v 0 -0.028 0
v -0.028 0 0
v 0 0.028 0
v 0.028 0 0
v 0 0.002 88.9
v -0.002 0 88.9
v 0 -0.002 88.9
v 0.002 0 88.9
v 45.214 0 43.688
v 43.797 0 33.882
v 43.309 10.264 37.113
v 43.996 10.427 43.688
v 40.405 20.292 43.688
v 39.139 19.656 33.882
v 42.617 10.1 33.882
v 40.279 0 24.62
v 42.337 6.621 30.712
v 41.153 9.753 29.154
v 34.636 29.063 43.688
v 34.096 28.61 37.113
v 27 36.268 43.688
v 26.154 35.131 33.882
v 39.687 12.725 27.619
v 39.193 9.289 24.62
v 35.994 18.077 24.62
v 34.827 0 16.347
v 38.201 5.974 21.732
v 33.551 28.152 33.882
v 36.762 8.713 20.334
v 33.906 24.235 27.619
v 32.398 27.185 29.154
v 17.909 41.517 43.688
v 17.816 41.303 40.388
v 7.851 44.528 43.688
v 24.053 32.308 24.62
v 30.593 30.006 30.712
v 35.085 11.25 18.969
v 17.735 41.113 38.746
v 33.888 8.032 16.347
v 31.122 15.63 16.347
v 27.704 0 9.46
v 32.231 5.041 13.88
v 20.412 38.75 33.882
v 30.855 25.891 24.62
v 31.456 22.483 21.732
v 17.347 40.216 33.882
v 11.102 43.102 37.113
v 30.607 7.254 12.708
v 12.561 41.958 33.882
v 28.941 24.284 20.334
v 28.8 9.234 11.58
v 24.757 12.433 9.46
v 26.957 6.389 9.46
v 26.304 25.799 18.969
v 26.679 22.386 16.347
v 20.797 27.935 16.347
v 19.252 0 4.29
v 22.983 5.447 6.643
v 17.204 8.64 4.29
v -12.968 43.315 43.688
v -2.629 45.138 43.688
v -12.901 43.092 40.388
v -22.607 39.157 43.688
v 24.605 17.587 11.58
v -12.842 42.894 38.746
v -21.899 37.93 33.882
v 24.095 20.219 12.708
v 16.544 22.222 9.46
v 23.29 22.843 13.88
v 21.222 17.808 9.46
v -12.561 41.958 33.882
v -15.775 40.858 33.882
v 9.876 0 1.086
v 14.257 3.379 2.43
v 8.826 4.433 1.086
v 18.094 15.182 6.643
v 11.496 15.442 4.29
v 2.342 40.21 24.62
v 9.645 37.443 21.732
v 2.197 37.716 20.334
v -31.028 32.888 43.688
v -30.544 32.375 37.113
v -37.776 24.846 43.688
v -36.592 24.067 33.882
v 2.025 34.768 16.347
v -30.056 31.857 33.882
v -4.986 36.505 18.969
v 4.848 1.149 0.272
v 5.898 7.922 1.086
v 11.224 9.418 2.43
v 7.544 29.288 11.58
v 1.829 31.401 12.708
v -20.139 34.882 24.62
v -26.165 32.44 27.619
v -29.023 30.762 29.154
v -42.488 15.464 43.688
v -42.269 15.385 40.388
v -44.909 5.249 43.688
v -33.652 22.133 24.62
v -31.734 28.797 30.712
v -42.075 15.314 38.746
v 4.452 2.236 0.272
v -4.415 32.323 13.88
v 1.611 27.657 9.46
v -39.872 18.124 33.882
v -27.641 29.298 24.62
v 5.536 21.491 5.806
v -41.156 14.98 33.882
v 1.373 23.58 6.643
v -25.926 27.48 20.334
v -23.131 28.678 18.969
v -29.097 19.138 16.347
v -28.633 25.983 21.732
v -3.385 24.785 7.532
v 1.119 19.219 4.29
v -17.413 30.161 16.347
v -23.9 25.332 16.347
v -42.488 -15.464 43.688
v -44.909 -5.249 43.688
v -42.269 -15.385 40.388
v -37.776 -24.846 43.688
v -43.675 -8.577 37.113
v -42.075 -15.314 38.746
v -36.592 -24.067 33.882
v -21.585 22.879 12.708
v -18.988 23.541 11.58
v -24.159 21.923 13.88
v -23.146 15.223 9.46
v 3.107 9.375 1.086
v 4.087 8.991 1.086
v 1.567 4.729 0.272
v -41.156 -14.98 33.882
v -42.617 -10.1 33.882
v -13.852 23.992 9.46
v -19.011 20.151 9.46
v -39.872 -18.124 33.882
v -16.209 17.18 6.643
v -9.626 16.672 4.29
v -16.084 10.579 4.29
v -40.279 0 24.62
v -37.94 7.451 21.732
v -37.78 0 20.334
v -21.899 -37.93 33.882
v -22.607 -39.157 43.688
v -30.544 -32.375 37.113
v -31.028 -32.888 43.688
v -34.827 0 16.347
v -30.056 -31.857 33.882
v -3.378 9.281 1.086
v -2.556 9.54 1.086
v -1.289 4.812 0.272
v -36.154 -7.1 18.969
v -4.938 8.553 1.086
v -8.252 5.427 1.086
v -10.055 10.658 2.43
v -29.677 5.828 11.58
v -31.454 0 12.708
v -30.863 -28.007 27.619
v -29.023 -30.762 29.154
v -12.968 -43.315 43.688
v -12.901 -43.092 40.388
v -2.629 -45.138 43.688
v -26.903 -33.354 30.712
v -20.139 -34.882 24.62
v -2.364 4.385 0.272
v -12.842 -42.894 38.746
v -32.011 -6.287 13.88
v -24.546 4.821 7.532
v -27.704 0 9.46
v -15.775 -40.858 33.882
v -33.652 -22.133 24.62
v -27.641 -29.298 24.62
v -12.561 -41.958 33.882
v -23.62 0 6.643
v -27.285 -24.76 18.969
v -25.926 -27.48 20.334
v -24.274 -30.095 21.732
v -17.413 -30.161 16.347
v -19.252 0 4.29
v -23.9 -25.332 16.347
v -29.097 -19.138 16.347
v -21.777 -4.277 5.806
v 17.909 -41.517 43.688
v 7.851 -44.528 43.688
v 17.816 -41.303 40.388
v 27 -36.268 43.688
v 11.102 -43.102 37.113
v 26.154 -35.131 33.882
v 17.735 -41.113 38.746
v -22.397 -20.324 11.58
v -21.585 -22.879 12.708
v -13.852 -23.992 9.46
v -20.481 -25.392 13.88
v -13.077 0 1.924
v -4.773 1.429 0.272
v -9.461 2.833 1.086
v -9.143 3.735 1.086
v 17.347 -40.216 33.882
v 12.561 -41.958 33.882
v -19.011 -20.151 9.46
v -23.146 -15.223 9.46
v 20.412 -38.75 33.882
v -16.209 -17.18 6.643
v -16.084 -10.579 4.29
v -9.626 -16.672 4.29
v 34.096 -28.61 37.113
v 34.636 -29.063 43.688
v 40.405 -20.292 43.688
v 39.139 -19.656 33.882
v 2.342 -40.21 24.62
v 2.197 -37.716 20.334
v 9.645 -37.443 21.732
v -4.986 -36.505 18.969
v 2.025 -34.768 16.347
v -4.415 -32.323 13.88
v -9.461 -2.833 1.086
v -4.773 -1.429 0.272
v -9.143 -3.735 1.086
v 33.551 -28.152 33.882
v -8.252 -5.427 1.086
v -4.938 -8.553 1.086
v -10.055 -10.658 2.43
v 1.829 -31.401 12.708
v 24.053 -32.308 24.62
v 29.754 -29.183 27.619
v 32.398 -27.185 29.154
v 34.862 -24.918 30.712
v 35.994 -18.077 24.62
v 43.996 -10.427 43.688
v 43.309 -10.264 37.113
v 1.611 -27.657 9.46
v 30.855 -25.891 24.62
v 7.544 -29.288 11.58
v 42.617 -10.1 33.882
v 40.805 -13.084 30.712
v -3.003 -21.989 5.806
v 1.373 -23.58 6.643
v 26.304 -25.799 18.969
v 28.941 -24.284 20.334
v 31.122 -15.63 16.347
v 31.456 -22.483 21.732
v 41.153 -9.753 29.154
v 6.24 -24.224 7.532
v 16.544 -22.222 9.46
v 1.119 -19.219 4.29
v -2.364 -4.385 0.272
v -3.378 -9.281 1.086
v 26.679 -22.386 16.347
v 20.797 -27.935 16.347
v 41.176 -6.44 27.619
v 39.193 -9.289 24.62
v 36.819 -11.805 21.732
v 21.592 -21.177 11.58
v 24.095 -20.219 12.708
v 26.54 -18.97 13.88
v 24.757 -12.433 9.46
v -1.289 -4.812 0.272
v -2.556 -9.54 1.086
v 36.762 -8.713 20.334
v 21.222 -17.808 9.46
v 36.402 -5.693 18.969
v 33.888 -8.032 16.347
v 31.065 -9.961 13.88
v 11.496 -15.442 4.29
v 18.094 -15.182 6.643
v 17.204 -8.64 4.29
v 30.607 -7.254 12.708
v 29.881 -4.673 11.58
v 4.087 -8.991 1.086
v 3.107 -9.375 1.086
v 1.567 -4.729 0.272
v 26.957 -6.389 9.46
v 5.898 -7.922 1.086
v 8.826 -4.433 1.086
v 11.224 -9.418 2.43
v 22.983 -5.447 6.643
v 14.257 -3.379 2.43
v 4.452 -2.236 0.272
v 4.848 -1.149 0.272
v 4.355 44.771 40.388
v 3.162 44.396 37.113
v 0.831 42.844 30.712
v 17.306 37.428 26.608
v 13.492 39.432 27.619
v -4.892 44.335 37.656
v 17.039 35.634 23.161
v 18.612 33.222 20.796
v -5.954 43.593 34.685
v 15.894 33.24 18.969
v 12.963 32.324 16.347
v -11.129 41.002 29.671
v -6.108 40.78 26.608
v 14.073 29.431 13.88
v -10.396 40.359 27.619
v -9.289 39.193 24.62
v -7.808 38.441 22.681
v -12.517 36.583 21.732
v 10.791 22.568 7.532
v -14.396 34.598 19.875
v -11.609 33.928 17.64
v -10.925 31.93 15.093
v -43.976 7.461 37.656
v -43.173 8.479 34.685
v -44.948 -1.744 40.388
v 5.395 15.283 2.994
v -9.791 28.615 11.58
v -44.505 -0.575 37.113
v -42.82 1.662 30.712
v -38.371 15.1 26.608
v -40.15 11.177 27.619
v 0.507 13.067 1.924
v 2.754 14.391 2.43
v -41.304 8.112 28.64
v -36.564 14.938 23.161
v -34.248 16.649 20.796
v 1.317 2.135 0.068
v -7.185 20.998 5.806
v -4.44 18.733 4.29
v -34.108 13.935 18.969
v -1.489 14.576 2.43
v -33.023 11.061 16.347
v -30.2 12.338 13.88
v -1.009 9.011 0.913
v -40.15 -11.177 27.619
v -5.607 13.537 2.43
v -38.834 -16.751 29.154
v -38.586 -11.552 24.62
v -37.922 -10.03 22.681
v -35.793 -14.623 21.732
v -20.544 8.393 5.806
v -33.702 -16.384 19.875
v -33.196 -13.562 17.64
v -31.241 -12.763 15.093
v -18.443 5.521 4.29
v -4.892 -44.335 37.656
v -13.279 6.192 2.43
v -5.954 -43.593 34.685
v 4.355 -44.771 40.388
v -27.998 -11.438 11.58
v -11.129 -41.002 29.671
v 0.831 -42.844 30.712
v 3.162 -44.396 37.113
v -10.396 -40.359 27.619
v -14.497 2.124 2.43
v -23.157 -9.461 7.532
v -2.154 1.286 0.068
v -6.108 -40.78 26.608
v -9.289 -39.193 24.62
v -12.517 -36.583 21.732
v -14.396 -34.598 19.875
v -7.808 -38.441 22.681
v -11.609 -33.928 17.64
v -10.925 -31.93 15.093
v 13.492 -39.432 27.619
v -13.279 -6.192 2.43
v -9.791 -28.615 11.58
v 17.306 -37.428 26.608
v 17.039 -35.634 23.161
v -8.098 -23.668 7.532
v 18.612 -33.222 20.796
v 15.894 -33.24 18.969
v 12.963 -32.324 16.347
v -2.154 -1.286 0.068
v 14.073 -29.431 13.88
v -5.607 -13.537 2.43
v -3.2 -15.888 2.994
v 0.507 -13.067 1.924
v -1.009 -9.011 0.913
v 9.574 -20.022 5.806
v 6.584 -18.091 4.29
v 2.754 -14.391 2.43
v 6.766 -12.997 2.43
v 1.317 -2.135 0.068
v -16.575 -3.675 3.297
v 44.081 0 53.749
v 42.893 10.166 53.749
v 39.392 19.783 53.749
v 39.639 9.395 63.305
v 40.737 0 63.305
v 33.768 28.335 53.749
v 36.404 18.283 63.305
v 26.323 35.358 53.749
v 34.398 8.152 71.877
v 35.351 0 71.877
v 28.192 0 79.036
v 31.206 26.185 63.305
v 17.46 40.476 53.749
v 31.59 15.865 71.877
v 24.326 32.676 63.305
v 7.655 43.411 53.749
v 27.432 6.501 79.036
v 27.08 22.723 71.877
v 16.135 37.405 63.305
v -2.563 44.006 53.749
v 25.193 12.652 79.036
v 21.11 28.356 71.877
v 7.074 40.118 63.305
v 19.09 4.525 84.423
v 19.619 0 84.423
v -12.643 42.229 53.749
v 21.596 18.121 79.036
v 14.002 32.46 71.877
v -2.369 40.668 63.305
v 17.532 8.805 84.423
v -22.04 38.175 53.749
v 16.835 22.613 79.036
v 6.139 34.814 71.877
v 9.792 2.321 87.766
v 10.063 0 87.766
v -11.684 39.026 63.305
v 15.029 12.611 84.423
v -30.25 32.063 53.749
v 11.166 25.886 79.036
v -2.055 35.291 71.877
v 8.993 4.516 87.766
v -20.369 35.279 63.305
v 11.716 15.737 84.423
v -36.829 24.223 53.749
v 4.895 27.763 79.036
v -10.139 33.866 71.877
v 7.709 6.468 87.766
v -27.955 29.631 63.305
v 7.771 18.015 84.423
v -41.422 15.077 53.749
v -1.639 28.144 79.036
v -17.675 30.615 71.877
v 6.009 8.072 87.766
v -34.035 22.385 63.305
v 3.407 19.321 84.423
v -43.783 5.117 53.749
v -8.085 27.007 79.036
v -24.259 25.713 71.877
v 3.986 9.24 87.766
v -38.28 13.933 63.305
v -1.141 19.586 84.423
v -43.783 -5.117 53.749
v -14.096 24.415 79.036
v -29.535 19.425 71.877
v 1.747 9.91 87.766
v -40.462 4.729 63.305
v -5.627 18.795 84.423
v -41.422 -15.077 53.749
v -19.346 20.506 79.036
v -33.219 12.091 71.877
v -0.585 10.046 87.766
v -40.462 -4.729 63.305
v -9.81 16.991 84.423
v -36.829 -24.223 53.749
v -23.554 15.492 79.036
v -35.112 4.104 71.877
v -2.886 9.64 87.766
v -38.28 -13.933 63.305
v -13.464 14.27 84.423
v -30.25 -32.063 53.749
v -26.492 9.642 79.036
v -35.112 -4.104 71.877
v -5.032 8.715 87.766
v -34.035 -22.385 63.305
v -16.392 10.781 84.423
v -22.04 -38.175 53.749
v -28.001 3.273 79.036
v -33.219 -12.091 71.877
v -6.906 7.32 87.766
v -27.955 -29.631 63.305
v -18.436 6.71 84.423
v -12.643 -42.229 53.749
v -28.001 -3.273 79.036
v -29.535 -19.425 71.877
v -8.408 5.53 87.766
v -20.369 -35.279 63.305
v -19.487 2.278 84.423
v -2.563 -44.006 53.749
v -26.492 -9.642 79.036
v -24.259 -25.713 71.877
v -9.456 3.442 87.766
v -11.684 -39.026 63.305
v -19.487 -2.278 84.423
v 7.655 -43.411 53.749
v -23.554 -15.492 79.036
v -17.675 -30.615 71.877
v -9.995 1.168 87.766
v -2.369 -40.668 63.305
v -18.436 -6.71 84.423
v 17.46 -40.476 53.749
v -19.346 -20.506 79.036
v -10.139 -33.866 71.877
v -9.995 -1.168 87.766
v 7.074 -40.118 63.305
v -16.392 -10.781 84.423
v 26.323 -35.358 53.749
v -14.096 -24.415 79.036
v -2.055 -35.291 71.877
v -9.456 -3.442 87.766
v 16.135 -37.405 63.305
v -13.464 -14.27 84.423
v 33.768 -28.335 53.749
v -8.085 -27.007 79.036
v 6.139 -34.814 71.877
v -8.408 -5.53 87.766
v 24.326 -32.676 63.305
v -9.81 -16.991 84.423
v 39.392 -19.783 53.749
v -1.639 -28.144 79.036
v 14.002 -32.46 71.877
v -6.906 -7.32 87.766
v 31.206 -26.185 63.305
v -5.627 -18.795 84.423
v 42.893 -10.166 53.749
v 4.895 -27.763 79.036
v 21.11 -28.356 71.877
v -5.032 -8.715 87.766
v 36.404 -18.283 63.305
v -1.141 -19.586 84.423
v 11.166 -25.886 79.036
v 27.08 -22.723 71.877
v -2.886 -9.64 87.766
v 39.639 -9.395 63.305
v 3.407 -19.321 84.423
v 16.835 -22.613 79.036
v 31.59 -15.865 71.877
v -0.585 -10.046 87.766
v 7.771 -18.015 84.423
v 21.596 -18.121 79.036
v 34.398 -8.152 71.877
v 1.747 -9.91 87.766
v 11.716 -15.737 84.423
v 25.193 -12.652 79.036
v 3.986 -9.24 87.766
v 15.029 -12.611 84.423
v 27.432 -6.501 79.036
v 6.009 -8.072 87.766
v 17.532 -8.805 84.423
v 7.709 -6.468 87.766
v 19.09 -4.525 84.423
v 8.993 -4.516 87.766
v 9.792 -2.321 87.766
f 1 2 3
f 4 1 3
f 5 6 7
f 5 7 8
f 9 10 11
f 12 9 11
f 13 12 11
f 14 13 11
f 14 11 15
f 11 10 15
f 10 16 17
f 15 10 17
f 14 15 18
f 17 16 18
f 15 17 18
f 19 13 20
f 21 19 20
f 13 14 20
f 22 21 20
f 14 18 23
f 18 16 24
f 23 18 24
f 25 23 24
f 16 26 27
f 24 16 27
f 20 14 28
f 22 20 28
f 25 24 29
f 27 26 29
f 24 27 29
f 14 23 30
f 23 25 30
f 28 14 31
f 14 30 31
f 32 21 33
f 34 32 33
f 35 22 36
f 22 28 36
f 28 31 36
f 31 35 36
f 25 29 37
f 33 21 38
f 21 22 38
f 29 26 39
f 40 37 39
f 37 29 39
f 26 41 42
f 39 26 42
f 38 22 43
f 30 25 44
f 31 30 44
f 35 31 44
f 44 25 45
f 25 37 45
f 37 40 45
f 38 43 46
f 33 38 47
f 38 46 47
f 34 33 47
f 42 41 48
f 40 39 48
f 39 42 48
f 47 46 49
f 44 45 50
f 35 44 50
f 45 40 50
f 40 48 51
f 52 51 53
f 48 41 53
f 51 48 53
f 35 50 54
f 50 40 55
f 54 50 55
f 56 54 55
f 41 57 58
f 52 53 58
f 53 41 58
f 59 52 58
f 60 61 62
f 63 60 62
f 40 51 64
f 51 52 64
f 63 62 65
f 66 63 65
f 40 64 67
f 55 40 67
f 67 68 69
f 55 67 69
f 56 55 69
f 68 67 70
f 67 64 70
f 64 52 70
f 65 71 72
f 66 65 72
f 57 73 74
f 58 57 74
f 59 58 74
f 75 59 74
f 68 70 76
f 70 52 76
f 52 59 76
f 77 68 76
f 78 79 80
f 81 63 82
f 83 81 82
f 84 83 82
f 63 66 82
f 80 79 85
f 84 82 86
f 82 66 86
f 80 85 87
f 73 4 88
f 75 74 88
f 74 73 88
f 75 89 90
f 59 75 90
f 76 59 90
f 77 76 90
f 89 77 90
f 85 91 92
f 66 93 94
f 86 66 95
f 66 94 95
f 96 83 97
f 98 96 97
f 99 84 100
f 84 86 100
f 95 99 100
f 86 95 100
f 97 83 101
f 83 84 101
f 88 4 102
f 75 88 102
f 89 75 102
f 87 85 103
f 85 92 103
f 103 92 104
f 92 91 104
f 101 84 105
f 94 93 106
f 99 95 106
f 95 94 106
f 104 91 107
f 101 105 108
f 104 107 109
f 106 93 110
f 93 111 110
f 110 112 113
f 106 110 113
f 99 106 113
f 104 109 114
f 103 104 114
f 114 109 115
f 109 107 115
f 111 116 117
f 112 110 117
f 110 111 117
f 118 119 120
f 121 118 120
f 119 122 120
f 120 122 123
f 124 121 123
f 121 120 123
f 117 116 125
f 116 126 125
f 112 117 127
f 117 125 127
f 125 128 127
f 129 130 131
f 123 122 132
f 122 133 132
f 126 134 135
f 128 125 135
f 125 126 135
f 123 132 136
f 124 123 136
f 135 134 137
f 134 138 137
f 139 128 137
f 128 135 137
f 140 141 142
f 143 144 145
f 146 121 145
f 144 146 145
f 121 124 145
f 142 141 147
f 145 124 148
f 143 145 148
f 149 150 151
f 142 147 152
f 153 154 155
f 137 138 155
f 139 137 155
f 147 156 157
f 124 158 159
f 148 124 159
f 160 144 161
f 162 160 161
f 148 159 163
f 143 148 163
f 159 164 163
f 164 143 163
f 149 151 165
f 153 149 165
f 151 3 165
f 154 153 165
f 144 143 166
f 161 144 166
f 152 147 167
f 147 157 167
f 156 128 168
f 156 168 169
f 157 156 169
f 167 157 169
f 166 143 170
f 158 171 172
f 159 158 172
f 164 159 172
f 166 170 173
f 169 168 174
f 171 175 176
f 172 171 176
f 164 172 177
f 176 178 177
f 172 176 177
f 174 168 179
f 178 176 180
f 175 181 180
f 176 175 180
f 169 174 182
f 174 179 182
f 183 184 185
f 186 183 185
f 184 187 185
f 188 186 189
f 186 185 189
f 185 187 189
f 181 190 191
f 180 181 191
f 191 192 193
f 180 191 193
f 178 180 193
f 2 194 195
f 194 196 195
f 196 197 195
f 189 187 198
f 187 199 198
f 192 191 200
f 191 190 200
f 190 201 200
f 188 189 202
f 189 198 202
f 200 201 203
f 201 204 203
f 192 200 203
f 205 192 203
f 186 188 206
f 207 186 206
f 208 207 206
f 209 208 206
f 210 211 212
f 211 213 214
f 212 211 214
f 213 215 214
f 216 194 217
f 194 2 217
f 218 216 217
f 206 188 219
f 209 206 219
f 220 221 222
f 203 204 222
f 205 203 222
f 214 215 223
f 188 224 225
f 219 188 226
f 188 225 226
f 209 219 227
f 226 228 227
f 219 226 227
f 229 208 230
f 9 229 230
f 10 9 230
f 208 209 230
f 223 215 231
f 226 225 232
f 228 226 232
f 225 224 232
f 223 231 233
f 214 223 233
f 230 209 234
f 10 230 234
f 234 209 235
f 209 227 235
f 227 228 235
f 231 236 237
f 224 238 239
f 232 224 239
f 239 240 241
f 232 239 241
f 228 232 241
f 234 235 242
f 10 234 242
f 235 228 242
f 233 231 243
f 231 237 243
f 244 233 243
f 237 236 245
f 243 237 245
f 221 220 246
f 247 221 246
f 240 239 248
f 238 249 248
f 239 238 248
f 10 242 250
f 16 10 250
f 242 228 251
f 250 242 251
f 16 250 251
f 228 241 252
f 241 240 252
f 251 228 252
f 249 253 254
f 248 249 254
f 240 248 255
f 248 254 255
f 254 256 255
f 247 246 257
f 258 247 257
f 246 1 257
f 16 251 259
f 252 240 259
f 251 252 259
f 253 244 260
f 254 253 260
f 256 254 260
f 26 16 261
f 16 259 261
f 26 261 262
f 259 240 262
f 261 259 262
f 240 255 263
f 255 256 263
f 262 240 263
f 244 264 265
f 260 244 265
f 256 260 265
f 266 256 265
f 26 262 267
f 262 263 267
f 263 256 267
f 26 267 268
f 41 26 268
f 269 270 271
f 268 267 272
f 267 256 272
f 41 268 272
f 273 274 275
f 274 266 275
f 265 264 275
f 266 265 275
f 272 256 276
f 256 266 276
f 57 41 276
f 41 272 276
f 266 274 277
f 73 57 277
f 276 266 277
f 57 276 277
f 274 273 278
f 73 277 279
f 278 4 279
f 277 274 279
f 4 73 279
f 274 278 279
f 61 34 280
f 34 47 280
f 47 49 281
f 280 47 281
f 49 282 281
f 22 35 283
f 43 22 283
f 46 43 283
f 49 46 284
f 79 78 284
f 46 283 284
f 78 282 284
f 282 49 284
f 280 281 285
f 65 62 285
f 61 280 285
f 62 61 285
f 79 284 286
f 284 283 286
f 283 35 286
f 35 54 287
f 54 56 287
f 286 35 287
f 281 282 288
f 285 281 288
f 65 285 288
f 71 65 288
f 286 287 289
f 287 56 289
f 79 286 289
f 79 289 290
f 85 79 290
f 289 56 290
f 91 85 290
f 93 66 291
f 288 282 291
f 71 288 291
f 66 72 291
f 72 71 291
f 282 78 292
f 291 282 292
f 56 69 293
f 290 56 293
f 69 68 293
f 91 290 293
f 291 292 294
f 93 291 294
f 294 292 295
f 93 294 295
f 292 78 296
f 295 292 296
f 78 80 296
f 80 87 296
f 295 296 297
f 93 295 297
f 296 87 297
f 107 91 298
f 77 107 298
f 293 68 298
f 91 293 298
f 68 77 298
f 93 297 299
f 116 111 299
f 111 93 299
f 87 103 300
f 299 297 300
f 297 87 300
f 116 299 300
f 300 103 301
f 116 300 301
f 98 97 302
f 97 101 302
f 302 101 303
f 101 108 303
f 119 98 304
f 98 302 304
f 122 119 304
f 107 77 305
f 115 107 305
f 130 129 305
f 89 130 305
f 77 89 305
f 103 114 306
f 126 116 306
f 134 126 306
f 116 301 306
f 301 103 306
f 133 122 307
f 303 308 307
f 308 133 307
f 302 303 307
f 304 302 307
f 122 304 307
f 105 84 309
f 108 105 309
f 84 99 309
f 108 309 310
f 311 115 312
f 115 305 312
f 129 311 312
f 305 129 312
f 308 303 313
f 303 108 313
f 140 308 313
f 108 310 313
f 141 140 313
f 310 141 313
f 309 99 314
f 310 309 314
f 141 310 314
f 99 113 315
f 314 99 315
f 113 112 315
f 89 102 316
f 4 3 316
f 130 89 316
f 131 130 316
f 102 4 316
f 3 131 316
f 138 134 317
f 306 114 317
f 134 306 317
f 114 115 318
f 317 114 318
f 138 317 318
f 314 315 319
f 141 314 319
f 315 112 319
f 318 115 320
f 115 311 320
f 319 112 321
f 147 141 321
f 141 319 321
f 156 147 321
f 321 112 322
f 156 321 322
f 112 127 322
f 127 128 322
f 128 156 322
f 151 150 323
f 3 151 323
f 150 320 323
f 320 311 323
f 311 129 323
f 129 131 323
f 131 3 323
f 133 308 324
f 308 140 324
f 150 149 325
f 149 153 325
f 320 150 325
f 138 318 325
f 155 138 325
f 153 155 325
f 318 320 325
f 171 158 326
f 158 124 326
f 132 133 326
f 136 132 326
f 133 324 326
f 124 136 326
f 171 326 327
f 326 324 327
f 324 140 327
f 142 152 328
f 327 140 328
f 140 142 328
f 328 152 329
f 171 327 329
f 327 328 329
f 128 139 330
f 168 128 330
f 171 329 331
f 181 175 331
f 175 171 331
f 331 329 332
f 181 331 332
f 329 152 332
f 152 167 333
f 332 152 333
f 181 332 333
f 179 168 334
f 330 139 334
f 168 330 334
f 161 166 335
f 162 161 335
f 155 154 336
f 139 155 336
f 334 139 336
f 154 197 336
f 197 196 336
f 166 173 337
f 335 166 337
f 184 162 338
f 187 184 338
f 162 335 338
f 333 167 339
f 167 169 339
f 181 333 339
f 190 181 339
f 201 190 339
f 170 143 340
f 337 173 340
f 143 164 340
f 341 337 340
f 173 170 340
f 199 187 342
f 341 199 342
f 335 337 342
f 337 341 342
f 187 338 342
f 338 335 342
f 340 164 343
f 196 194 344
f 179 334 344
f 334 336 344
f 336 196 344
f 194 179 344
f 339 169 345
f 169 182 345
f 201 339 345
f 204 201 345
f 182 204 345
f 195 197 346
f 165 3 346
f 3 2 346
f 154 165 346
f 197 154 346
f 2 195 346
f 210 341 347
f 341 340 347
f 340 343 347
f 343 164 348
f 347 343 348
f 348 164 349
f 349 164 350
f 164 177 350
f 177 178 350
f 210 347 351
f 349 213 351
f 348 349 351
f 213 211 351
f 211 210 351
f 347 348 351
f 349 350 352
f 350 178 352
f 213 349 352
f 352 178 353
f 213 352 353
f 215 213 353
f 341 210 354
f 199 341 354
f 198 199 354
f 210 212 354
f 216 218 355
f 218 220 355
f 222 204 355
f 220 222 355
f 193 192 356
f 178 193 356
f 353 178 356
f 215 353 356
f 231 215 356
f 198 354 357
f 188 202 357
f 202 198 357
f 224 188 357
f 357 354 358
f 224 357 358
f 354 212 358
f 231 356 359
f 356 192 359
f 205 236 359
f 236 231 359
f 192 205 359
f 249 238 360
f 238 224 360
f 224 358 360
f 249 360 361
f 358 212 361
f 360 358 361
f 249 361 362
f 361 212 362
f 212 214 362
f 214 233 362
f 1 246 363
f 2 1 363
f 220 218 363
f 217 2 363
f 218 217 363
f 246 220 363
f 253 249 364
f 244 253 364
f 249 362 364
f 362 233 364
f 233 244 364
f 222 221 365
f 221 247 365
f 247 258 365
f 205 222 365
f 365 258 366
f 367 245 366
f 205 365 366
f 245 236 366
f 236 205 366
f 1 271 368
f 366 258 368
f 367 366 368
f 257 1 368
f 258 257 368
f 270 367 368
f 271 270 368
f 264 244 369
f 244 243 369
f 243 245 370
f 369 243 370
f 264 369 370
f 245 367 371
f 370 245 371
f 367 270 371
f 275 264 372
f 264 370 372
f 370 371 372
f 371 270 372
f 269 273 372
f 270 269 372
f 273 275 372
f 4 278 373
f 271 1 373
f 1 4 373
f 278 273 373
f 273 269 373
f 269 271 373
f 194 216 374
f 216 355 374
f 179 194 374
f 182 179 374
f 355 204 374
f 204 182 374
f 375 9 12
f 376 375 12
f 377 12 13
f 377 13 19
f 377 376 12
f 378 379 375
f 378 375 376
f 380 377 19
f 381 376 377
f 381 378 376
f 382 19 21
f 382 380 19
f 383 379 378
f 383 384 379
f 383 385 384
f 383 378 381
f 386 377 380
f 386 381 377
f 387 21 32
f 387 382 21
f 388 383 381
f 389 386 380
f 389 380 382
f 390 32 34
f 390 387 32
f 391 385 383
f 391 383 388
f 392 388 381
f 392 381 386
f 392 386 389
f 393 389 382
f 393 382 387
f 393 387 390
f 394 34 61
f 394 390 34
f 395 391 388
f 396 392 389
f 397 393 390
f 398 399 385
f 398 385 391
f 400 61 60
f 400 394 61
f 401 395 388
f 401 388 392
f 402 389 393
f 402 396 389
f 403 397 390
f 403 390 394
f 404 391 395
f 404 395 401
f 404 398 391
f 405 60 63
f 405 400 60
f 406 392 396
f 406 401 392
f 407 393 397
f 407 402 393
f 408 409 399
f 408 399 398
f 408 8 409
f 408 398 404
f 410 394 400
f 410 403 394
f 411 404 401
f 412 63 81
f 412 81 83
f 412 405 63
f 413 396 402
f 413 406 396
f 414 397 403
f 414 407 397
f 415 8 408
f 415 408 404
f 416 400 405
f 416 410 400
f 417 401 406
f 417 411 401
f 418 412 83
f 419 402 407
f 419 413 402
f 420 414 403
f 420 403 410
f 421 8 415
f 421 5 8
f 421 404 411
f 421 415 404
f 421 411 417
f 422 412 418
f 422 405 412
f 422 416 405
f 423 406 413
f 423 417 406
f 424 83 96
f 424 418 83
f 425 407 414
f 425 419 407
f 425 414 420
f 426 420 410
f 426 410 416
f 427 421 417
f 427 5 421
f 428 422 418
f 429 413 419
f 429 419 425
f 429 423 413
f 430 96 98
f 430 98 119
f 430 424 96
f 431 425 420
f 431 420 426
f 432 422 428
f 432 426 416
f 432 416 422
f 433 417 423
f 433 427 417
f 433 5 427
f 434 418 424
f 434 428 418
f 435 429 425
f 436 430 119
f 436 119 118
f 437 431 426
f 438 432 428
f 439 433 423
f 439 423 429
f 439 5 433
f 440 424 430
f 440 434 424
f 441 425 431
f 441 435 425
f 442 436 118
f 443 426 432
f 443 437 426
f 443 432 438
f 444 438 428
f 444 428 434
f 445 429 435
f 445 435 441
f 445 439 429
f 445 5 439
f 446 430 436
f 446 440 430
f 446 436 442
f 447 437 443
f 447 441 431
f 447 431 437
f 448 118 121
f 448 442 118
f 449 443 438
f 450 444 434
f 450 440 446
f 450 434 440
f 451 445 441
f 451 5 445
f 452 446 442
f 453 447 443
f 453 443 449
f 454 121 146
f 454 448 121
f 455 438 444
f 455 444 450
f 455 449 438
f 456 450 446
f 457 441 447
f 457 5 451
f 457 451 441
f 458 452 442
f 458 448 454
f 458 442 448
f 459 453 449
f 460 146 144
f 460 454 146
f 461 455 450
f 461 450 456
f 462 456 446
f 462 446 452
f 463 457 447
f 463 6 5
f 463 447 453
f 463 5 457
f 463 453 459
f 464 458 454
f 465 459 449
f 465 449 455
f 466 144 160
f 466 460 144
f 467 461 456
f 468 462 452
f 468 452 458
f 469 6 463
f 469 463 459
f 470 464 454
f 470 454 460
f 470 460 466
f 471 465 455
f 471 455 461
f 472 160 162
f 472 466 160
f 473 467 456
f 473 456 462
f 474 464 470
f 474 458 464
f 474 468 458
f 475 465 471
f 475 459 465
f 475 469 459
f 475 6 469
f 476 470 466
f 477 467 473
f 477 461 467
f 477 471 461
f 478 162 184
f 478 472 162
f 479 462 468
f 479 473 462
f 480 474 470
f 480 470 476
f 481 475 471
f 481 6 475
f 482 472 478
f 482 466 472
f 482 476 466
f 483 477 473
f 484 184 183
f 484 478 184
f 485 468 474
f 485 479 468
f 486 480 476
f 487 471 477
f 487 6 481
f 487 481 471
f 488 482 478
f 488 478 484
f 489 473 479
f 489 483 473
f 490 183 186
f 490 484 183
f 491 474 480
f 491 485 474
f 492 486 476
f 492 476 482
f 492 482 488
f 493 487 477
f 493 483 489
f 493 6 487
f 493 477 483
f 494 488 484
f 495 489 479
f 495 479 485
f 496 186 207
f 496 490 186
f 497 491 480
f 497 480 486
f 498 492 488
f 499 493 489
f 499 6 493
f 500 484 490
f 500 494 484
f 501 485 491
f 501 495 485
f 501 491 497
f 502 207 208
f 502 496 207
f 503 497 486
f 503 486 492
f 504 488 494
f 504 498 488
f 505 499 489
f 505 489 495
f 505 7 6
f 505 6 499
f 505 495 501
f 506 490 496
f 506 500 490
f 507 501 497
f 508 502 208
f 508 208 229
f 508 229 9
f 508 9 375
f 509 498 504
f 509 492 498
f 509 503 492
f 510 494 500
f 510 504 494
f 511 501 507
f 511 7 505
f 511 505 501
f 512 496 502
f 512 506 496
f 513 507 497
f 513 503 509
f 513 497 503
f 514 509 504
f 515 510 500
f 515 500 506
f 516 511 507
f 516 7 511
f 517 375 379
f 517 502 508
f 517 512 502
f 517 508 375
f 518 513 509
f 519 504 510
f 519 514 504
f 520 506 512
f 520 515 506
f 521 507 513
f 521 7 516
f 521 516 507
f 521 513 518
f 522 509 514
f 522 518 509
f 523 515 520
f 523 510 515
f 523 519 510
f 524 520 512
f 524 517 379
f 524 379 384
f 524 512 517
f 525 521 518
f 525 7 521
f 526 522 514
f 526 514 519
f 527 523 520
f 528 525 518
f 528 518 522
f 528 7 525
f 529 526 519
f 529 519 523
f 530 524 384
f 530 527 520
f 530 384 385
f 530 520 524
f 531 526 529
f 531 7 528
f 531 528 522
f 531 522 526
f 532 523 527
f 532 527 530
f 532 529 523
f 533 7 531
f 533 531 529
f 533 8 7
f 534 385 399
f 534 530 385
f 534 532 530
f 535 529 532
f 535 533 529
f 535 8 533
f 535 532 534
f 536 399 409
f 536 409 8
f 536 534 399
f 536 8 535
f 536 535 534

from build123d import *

# Parameters (mm, degrees)
F0_R     = 45.214458384
F1_DEPTH = 88.9
F2_R     = 45.212


# Not quite as in the source:
# - a fillet or chamfer that OpenCascade refuses, or shapes differently, is made with other operations: its cross-section is extruded or revolved along the edge and cut away or added


with BuildPart() as f1:
    # F0 (on Top) → F1 (new body)
    with BuildSketch(Plane.XY):
        Circle(F0_R)
    extrude(amount=F1_DEPTH)

    # F2
    f2_edges = [f1.edges().sort_by_distance(p)[0] for p in [
        (-45.214458, 0, 88.9),
    ]]
    fillet(f2_edges, radius=F2_R)

    # F3: fillet of radius 45.212 on 1 edges, made by hand

    # F3_s1 → F3_t2 (revolve, cut)
    with BuildSketch(Plane.XZ):
        with BuildLine():
            ThreePointArc((45.214458384, 43.688), (31.4544287444, 12.7079384692), (0.0281510775, 0))
            Line((0.0281510775, 0), (0.0281510775, -0.90424))
            Line((0.0281510775, -0.90424), (45.214458384, -0.90424))
            Line((45.214458384, -0.90424), (46.118698384, 0))
            ThreePointArc((46.118698384, 0), (46.118698384, 21.844), (46.1181845301, 43.65752))
            Line((46.1181845301, 43.65752), (45.214458384, 43.688))
        make_face()
    revolve(axis=Axis((0, 0, 0), (0, 0, 1)), mode=Mode.SUBTRACT)


solid = f1.part
